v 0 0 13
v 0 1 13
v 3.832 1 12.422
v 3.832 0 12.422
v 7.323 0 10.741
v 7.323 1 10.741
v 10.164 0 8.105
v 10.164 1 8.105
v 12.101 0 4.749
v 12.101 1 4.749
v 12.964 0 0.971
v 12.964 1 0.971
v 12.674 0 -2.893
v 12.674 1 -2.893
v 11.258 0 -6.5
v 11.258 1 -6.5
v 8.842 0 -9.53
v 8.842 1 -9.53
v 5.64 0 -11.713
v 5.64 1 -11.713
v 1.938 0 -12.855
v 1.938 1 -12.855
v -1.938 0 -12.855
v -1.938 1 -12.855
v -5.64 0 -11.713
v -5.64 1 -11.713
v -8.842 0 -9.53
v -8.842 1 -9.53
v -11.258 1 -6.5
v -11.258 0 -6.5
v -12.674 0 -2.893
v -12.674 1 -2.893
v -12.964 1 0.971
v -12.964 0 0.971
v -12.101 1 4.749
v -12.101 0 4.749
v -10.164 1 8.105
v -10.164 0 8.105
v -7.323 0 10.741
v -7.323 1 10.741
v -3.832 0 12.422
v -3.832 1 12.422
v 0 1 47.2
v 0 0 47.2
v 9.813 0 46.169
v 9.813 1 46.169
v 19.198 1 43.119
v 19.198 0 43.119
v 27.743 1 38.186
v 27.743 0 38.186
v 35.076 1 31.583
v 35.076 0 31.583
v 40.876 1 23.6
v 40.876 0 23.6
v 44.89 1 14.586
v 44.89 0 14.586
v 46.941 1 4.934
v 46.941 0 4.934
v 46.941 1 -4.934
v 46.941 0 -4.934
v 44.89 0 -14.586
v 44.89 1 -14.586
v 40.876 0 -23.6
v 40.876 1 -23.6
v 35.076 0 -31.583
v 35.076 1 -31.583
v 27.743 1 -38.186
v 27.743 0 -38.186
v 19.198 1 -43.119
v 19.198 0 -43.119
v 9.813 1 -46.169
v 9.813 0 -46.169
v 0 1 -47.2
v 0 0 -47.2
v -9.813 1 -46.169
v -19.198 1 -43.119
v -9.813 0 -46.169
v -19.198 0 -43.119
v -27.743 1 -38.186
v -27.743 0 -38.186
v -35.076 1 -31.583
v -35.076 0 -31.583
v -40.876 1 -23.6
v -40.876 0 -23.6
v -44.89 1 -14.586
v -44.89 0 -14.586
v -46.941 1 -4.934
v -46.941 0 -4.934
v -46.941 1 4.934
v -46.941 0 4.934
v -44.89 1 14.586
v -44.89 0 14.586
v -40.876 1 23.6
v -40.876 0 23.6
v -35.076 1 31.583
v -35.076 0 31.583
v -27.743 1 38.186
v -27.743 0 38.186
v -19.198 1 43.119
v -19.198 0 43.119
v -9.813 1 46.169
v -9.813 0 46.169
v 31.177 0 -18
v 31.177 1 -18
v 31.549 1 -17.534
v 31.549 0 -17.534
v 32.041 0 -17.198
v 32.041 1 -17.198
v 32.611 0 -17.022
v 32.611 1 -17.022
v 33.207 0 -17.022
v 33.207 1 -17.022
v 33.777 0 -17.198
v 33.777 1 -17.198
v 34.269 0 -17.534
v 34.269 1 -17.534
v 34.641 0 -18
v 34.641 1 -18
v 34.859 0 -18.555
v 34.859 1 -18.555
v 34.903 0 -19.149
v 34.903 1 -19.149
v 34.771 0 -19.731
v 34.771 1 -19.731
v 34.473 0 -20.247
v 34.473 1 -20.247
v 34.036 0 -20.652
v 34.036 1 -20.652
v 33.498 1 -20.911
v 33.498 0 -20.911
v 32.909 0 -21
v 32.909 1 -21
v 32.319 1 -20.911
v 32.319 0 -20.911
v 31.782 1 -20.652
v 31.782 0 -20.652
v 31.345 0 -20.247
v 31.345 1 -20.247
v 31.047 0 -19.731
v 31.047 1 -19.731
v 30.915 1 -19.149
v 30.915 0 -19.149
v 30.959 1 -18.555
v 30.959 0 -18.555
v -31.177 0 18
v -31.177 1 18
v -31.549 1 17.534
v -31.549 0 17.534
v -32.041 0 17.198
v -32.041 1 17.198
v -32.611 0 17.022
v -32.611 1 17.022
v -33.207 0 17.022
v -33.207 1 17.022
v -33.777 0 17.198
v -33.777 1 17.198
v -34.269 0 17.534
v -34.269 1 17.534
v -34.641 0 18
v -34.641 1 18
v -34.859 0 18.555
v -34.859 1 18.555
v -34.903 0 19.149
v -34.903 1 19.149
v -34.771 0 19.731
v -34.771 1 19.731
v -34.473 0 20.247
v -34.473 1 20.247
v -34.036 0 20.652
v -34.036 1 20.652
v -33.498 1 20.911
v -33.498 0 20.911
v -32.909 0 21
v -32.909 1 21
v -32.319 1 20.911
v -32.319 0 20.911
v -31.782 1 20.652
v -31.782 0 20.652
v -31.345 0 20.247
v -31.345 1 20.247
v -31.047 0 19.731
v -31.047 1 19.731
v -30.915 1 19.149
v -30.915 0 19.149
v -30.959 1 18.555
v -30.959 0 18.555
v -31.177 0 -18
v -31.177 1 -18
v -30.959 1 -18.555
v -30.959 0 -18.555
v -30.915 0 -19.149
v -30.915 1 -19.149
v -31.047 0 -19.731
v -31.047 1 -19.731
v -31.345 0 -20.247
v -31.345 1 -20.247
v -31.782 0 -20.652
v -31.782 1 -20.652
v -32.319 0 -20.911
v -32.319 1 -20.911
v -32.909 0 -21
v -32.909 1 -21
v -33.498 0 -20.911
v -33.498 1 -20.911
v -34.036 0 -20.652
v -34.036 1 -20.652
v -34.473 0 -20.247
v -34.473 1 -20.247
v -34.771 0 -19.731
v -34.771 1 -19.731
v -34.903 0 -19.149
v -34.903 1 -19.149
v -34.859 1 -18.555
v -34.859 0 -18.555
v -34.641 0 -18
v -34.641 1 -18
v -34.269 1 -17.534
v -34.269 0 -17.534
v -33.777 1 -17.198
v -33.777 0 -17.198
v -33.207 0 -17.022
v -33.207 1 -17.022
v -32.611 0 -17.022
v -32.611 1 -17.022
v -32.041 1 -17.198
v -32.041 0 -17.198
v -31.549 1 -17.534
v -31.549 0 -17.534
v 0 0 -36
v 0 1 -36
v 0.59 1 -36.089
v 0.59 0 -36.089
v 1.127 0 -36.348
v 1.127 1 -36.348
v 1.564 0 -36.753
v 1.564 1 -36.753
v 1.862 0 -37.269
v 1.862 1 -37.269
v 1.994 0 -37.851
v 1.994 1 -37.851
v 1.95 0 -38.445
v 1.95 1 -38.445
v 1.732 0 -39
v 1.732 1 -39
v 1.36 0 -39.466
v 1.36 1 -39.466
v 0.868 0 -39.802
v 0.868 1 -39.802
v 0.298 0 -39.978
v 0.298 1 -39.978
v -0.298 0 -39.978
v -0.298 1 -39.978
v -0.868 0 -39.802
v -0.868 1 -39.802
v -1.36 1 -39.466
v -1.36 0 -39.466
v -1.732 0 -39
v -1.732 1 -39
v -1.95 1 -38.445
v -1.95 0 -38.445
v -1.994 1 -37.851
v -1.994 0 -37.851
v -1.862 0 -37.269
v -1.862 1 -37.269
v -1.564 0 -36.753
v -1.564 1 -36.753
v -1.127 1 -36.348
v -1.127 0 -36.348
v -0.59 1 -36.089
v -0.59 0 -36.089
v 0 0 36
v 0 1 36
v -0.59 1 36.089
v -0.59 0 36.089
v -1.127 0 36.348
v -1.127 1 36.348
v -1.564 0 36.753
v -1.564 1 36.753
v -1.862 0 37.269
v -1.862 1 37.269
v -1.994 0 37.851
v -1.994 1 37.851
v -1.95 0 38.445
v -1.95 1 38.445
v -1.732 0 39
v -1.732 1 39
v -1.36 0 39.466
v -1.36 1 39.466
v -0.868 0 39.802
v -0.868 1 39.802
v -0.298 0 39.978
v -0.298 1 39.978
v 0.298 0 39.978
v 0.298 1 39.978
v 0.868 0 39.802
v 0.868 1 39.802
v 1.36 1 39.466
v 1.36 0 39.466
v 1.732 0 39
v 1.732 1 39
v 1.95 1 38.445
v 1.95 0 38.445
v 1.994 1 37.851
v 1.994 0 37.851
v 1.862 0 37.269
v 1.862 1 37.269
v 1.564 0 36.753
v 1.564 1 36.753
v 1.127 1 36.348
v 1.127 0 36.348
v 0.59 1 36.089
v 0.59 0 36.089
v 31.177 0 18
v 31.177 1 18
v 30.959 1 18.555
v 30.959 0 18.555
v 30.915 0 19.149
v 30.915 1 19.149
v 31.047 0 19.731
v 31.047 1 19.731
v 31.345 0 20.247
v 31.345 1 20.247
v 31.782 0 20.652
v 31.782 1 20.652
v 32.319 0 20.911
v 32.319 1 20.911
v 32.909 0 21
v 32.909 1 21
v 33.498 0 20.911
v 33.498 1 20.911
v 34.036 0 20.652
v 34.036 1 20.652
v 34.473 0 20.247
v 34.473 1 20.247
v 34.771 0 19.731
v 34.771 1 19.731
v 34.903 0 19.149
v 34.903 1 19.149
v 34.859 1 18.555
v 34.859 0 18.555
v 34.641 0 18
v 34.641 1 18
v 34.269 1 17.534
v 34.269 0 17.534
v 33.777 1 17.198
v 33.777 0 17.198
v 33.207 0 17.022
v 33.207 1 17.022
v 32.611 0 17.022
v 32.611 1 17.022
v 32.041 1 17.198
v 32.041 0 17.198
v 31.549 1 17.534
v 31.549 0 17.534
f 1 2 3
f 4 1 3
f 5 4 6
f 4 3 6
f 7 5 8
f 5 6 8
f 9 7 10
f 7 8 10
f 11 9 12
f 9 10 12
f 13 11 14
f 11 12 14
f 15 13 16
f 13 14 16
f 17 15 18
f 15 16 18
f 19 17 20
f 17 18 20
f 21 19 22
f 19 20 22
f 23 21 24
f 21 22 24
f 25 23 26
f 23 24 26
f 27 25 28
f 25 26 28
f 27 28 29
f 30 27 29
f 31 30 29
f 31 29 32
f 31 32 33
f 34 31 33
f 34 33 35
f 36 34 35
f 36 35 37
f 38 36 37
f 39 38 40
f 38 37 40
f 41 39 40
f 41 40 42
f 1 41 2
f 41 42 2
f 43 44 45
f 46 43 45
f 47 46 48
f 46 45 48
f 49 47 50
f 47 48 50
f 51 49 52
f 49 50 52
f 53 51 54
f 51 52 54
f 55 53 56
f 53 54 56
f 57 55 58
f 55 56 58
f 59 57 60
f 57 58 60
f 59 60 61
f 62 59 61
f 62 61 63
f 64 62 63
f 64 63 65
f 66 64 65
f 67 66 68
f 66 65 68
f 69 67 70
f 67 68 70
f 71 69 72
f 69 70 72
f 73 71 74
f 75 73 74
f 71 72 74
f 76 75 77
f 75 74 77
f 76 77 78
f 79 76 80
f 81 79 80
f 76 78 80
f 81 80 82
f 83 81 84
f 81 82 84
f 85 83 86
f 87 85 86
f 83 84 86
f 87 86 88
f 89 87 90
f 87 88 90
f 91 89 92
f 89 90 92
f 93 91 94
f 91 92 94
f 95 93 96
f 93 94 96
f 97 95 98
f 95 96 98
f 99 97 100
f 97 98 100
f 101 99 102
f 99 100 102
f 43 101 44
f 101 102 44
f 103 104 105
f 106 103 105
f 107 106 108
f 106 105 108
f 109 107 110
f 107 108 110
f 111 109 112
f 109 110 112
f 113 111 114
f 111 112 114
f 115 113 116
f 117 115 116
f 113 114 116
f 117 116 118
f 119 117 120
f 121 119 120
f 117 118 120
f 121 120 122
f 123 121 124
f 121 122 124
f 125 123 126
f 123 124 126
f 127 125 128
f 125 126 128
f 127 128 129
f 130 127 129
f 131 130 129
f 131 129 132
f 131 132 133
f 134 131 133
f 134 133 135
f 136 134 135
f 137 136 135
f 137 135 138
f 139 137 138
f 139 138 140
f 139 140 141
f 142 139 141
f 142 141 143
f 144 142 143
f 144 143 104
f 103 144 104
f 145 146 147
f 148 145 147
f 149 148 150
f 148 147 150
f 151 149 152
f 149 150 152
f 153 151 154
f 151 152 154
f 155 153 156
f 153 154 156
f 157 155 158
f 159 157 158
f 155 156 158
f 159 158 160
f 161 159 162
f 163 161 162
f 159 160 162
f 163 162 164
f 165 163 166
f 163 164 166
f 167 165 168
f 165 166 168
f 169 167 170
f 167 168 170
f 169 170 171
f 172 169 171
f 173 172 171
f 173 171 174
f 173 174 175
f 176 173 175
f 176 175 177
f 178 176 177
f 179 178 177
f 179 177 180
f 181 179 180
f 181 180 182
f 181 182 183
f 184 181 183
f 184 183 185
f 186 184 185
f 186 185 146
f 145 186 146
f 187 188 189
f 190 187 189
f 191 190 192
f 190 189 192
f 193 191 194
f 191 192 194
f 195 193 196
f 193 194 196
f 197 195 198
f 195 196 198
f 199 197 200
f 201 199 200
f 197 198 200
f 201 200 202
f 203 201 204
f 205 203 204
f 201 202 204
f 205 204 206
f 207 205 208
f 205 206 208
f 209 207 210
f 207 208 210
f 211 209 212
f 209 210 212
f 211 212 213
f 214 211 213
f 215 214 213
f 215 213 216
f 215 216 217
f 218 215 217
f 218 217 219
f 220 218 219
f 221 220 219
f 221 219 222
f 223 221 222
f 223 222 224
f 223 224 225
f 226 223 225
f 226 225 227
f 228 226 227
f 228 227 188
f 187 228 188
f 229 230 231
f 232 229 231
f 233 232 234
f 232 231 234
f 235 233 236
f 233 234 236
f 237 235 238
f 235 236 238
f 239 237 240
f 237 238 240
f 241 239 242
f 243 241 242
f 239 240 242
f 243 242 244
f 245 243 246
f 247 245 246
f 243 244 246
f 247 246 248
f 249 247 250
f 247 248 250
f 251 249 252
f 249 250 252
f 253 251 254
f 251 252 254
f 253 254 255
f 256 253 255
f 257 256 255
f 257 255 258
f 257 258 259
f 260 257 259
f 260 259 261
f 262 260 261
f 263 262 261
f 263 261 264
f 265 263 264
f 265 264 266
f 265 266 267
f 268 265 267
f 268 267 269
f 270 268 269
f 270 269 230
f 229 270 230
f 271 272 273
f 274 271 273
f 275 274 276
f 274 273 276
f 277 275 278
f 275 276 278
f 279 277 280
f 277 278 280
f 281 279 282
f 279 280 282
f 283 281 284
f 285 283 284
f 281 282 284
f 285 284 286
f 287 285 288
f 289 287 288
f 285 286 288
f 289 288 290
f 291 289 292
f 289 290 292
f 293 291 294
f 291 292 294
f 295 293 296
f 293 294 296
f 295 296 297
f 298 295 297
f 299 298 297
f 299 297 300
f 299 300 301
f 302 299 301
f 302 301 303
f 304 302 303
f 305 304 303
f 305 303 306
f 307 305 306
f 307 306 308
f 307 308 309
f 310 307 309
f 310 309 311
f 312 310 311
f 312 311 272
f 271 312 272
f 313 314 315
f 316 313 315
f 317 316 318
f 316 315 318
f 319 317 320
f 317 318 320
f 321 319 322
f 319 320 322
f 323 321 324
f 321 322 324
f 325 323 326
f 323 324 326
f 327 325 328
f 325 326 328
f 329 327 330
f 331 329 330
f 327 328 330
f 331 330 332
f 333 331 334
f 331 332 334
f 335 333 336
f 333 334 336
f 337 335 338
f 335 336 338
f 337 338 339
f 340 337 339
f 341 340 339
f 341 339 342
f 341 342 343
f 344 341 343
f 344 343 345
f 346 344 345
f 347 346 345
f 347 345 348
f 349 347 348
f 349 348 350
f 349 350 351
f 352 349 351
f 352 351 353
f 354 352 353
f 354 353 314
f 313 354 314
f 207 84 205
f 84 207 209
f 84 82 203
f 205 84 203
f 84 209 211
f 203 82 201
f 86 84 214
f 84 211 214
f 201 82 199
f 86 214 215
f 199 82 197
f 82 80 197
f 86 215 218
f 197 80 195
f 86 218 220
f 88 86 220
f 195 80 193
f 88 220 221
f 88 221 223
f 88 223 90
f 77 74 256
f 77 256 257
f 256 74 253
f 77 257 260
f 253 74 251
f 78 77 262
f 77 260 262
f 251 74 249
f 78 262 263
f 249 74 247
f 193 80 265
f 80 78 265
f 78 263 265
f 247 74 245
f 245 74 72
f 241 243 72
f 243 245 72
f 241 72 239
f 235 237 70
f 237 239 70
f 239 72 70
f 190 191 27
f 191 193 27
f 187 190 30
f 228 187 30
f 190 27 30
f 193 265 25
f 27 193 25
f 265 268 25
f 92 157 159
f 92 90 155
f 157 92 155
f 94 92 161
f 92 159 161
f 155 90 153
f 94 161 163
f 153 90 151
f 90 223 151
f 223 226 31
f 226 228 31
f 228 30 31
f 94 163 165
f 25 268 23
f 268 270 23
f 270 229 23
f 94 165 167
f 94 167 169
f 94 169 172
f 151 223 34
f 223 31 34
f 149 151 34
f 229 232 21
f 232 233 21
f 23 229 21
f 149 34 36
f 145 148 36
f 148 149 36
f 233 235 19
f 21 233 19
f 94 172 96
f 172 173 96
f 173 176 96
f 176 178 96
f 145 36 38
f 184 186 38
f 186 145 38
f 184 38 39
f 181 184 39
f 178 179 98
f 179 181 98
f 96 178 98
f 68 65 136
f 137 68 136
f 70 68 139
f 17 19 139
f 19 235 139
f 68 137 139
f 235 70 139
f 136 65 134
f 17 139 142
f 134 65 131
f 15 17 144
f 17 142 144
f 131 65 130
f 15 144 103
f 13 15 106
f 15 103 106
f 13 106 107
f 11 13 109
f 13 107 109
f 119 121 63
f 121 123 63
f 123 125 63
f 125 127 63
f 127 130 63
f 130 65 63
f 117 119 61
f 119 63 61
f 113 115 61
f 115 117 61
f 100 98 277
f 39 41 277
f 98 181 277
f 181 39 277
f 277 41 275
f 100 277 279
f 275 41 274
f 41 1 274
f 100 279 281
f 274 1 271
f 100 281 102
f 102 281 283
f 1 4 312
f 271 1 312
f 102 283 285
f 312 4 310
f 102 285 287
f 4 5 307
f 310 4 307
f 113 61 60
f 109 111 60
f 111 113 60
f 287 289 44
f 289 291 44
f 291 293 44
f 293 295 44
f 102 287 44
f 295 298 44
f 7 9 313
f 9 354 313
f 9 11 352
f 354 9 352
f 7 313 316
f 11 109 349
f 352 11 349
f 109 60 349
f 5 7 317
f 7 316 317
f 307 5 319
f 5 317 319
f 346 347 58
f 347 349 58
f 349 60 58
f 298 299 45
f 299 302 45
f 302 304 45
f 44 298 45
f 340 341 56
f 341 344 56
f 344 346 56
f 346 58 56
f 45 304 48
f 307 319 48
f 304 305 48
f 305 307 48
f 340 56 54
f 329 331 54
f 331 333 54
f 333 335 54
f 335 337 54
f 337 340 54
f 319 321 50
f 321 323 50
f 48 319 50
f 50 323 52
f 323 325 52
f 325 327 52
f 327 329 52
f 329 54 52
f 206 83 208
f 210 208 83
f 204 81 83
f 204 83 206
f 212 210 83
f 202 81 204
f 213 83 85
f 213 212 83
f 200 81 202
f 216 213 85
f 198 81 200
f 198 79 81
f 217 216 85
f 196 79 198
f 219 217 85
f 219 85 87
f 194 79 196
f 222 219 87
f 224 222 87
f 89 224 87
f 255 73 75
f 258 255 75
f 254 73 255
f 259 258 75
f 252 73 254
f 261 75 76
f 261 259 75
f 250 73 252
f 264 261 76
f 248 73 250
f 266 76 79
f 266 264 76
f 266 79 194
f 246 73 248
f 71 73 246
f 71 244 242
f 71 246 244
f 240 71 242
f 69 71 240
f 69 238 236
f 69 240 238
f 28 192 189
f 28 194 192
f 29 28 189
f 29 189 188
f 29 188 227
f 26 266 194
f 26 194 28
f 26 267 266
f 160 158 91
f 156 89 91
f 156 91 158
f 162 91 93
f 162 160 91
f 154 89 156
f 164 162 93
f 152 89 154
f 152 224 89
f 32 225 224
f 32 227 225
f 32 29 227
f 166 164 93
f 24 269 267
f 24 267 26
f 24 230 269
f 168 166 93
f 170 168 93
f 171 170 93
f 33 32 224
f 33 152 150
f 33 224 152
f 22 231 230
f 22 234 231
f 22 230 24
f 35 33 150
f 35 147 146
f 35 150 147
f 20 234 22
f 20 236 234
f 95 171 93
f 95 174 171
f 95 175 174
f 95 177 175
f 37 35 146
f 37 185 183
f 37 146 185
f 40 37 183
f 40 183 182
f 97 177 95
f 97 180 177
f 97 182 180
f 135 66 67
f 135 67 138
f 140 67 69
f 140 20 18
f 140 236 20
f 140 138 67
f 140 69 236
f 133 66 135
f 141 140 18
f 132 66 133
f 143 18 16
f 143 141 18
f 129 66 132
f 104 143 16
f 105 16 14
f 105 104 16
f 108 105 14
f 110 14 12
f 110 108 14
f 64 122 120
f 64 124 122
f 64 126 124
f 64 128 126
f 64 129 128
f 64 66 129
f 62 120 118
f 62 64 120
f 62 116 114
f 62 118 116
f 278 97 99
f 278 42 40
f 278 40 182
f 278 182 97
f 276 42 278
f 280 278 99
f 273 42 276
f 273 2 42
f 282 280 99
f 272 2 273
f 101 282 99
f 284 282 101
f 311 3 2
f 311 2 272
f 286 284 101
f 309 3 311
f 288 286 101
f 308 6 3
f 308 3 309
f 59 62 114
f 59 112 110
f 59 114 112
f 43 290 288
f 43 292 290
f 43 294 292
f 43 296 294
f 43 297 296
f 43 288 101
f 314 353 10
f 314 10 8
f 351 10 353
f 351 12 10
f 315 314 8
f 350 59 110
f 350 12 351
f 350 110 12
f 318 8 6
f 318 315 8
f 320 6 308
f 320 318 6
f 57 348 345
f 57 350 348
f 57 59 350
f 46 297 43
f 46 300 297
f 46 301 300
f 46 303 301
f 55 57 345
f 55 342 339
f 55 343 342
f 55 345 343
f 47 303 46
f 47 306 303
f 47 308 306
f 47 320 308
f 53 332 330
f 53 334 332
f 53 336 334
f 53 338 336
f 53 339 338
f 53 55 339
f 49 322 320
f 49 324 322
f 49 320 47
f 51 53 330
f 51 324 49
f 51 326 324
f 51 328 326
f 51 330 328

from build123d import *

# Parameters (mm, degrees)
SKETCH1_R           = 47.2
BOSS_EXTRUDE1_DEPTH = 1
SKETCH2_R           = 13
CUT_EXTRUDE1_DEPTH  = 1
SKETCH4_R           = 2
CUT_EXTRUDE3_DEPTH  = 67.758370262
CIRPATTERN1_COUNT   = 6


with BuildPart() as part:
    # Sketch1 → Boss-Extrude1 (new body)
    with BuildSketch(Plane(origin=(0, 0, 0), x_dir=(1, 0, 0), z_dir=(0, 1, 0))):
        with Locations(Location((0, 0, 0), (0, 0, 270))):
            Circle(SKETCH1_R)
    extrude(amount=BOSS_EXTRUDE1_DEPTH)

    # Sketch2 → Cut-Extrude1 (cut)
    with BuildSketch(Plane(origin=(0, 1, 0), x_dir=(1, 0, 0), z_dir=(0, 1, 0))):
        with Locations(Location((0, 0, 0), (0, 0, 270))):
            Circle(SKETCH2_R)
    extrude(amount=-CUT_EXTRUDE1_DEPTH, mode=Mode.SUBTRACT)

    # Sketch4 → Cut-Extrude3 (cut, through all)
    with BuildSketch(Plane(origin=(0, 1, 0), x_dir=(1, 0, 0), z_dir=(0, 1, 0))):
        with Locations(Location((0, 38, 0), (0, 0, 270))):
            Circle(SKETCH4_R)
    cut_extrude3 = extrude(amount=-CUT_EXTRUDE3_DEPTH, mode=Mode.SUBTRACT)

    # CirPattern1: Cut-Extrude3 ×6 about axis
    cirpattern1_axis = Axis((0, 0, 0), (0, 1, 0))
    for i in range(1, CIRPATTERN1_COUNT):
        add(cut_extrude3.rotate(cirpattern1_axis, i * 360 / CIRPATTERN1_COUNT), mode=Mode.SUBTRACT)


solid = part.part
